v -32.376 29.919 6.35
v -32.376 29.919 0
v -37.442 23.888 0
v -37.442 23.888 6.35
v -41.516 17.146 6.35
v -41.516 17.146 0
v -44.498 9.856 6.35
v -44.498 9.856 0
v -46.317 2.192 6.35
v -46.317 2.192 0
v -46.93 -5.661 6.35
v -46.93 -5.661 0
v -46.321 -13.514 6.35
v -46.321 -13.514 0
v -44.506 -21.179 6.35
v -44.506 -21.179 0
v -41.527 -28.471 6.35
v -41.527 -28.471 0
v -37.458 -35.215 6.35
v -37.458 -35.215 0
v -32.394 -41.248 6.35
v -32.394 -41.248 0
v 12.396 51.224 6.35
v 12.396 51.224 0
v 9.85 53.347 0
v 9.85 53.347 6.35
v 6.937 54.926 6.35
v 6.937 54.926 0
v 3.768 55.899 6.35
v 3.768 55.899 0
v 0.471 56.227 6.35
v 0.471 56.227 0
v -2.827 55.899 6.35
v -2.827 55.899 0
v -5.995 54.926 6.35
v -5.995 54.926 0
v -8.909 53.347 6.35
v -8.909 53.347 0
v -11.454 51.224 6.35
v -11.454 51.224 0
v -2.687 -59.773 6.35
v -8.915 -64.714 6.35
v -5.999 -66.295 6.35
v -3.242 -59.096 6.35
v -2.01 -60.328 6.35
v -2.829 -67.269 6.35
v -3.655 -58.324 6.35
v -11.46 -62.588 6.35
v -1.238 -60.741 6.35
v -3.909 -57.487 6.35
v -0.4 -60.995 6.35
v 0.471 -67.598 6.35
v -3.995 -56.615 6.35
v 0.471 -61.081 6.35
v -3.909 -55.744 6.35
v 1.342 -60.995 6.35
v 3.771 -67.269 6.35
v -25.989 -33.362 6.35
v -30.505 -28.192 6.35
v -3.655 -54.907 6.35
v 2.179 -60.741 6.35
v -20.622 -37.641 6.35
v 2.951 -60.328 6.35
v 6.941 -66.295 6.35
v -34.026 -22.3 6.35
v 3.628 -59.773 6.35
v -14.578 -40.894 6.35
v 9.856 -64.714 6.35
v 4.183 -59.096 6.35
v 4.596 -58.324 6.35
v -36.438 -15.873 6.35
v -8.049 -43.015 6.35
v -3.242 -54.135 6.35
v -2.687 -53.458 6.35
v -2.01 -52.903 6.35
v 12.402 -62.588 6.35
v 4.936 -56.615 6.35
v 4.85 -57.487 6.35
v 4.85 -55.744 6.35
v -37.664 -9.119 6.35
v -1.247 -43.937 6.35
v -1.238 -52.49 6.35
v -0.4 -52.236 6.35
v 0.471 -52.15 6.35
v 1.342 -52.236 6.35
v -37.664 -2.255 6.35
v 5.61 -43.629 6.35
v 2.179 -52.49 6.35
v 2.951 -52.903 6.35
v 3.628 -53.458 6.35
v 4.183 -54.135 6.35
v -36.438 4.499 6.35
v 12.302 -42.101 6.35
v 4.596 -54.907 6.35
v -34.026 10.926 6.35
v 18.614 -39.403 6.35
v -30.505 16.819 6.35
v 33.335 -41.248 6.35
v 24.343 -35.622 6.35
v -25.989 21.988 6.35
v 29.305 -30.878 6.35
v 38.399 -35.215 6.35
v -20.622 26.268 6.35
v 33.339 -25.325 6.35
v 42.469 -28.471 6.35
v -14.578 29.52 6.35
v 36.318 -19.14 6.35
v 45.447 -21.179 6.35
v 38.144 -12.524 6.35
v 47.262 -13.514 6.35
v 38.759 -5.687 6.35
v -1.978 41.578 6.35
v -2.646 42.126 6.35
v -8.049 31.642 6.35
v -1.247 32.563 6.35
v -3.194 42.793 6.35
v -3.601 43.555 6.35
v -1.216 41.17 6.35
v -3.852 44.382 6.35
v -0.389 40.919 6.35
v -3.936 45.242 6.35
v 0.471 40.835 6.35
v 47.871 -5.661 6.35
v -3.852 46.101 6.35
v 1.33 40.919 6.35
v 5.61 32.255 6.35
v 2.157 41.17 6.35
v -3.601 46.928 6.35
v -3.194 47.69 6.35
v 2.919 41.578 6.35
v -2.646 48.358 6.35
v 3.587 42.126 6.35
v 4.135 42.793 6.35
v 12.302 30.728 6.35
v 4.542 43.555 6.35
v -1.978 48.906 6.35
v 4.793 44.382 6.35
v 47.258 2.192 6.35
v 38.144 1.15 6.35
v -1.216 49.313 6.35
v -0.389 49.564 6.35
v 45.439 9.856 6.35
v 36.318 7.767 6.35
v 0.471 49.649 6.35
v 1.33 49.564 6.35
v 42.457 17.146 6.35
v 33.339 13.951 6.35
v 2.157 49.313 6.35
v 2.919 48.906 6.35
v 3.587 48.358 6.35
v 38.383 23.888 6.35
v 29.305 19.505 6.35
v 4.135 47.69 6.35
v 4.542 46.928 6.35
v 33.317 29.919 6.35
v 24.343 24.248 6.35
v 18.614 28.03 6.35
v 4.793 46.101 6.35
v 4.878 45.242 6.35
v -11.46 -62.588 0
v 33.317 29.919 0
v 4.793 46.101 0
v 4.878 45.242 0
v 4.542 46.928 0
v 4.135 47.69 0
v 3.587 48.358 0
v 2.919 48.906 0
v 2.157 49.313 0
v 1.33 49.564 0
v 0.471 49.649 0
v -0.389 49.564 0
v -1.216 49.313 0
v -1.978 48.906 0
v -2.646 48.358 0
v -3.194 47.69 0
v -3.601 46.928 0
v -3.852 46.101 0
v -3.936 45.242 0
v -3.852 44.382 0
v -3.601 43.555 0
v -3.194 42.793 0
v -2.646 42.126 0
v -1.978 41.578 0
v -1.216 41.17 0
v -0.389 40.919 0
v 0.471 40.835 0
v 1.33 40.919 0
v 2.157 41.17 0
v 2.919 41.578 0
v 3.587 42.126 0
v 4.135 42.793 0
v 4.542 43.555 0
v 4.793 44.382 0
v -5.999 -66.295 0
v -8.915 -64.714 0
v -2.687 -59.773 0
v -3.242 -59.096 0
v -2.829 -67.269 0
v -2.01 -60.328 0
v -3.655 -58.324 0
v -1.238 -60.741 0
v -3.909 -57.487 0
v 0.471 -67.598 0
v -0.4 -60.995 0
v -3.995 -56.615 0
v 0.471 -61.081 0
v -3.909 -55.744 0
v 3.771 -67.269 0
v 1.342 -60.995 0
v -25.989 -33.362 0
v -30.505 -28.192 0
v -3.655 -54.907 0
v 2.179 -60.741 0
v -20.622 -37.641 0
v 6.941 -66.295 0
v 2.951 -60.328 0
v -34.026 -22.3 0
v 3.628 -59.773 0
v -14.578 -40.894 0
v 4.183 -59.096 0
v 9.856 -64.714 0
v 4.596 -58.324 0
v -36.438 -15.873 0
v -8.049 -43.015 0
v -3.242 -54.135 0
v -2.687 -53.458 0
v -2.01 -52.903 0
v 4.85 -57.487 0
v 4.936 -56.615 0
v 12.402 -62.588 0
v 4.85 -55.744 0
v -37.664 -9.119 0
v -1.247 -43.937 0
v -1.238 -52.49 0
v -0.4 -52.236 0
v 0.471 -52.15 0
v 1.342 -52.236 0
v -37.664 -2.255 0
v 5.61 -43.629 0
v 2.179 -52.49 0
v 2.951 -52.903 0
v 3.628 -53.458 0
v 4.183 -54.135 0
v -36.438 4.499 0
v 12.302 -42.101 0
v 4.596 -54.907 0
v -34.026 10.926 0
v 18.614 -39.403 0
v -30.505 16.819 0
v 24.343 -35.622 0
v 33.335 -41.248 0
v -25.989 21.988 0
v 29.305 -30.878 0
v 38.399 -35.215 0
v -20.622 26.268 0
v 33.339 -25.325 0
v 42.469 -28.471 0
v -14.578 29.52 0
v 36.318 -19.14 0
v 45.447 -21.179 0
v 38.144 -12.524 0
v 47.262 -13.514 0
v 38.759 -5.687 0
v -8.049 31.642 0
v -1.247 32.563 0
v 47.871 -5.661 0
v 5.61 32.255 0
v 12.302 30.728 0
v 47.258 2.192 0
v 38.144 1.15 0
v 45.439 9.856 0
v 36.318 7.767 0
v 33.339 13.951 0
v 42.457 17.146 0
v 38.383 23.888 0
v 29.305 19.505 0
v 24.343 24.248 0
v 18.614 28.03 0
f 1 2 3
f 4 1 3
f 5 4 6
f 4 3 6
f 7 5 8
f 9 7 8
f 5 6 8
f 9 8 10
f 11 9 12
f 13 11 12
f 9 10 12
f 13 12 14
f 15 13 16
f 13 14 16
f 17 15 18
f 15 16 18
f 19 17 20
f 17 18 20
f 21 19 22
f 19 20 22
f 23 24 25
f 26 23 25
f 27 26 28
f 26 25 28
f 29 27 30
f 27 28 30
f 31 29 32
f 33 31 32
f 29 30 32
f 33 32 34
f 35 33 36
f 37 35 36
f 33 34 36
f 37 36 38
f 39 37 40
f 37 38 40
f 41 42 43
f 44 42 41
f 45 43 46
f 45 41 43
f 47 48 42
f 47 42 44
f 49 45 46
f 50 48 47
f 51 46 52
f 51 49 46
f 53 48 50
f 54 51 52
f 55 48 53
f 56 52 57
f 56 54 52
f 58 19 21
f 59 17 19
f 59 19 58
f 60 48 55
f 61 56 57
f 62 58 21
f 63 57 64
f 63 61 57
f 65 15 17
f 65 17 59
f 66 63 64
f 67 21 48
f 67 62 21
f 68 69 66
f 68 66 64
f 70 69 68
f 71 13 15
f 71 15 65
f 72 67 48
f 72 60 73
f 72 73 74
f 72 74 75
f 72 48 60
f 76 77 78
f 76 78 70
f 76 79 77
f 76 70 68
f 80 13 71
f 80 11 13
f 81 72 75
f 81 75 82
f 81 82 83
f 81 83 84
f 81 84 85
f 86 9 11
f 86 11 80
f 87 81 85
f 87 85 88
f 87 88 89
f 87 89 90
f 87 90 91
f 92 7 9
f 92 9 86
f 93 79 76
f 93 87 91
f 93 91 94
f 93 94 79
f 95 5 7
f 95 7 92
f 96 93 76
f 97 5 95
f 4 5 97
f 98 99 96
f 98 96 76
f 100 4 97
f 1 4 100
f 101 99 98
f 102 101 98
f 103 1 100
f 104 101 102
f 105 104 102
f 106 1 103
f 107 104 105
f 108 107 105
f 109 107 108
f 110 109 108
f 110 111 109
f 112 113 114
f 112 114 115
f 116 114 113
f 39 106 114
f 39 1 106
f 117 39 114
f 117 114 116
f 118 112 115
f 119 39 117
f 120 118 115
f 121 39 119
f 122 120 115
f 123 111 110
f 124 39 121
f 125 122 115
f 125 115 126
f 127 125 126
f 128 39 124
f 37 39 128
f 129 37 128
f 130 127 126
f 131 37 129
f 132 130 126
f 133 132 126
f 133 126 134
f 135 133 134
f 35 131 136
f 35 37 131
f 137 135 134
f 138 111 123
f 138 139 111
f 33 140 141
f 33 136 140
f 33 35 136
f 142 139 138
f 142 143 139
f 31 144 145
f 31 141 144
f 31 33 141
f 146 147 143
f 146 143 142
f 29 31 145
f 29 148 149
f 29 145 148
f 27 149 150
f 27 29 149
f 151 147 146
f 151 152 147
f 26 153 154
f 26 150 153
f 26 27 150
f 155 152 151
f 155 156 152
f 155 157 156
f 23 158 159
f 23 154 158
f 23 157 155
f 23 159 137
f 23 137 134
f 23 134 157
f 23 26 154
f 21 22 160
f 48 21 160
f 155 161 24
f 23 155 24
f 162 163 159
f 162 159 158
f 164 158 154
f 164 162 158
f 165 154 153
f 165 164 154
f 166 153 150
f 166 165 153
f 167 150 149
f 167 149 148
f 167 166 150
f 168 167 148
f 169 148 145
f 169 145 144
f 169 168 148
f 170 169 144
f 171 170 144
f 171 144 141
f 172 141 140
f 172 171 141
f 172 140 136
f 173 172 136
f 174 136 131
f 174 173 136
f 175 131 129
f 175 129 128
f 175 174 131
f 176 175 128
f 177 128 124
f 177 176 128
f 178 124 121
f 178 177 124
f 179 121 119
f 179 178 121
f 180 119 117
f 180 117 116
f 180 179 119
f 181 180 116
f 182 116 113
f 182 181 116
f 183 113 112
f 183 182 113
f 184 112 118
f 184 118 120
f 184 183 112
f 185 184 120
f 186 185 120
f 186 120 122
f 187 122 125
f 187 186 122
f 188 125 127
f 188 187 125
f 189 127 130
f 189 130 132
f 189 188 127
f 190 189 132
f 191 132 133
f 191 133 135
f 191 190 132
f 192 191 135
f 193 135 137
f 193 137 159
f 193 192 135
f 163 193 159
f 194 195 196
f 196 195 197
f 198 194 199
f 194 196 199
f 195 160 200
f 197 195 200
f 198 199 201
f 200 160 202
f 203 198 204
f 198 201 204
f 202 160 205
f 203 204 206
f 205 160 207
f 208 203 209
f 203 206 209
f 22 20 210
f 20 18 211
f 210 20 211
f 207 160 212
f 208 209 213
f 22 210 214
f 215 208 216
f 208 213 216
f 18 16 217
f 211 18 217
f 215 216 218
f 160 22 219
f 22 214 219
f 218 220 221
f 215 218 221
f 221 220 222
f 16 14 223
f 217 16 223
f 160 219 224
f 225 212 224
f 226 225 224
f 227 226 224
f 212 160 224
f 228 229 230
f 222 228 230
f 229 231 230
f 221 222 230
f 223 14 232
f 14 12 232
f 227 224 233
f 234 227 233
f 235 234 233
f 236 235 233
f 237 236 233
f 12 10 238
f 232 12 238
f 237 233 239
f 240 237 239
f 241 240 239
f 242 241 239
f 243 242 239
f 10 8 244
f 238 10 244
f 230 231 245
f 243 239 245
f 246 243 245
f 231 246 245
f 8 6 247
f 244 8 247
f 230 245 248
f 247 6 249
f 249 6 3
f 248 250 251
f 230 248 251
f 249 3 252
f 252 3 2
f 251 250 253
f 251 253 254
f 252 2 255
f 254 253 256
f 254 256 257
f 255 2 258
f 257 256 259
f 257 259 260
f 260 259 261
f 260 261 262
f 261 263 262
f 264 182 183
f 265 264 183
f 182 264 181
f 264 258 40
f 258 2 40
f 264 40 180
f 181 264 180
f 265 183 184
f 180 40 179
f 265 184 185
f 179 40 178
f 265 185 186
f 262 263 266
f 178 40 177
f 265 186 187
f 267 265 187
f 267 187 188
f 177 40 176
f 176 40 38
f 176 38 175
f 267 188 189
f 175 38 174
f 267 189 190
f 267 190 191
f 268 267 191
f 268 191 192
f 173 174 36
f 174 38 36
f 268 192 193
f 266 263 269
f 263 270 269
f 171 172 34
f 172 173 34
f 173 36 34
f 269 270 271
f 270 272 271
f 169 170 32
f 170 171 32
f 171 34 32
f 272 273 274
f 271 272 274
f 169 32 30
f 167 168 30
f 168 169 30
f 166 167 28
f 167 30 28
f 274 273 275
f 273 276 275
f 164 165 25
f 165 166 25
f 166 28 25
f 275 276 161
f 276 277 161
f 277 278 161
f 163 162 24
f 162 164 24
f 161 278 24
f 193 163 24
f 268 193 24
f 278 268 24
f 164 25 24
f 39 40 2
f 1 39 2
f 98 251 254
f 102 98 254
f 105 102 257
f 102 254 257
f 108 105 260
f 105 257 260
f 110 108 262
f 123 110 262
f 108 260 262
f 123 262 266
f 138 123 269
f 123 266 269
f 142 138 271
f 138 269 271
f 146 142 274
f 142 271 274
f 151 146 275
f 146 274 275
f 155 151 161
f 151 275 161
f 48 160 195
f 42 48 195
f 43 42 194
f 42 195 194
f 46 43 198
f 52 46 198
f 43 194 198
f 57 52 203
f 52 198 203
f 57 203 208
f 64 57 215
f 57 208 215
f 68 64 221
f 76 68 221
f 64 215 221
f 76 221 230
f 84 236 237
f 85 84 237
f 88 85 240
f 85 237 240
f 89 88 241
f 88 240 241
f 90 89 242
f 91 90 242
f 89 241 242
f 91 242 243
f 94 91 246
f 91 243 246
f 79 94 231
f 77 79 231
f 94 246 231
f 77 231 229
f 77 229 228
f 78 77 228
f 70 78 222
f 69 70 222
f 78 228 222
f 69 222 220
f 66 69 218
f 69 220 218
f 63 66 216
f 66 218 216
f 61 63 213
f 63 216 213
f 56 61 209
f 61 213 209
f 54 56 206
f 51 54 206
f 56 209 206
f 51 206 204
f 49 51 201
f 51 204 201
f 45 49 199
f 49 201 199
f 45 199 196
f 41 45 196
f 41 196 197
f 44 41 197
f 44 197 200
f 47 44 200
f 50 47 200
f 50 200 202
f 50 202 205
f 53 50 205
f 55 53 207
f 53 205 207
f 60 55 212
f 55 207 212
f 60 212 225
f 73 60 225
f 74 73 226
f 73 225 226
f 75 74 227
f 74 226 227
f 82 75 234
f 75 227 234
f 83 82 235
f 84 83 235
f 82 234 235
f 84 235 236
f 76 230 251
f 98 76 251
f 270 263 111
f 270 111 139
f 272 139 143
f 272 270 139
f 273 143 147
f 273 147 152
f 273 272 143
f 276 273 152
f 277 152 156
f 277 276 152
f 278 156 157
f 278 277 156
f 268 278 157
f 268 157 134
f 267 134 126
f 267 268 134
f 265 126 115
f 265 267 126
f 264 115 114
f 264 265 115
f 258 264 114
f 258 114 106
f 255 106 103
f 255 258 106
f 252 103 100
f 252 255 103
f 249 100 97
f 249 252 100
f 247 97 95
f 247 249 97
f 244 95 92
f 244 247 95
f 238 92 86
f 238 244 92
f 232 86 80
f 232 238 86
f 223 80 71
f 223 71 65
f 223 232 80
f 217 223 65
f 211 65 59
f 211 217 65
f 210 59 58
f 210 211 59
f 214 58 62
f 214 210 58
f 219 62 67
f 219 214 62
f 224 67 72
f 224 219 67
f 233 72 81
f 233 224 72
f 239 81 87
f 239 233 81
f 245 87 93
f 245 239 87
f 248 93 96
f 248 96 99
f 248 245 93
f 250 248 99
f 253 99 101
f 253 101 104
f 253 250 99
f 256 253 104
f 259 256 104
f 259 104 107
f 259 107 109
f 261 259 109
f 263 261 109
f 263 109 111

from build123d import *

# Parameters (mm, degrees)
F0_R     = 38.288437
F0_R_2   = 4.4069
F1_DEPTH = 6.35


with BuildPart() as f1:
    # F0 (on Top) → F1 (new body)
    with BuildSketch(Plane.XY):
        with BuildLine():
            ThreePointArc((12.395513, 51.224059), (0.470607, 56.227106), (-11.454299, 51.224059))
            Line((-11.454299, 51.224059), (-32.375696, 29.918984))
            ThreePointArc((-32.375696, 29.918984), (-46.92978, -5.660917), (-32.394285, -41.248415))
            Line((-32.394285, -41.248415), (-11.460414, -62.588481))
            ThreePointArc((-11.460414, -62.588481), (0.470607, -67.597759), (12.401629, -62.588481))
            Line((12.401629, -62.588481), (33.335499, -41.248415))
            ThreePointArc((33.335499, -41.248415), (47.870994, -5.660917), (33.31691, 29.918984))
            Line((33.31691, 29.918984), (12.395513, 51.224059))
        make_face()
        with BuildLine():
            ThreePointArc((0.470607, -52.150294), (3.62792, -53.458096), (4.935722, -56.615409))
            ThreePointArc((4.935722, -56.615409), (-2.686706, -59.772722), (0.470607, -52.150294))
        make_face(mode=Mode.SUBTRACT)
        with Locations((0.470607, -5.686851)):
            Circle(F0_R, mode=Mode.SUBTRACT)
        with Locations((0.470607, 45.241707)):
            Circle(F0_R_2, mode=Mode.SUBTRACT)
    extrude(amount=F1_DEPTH)


solid = f1.part
